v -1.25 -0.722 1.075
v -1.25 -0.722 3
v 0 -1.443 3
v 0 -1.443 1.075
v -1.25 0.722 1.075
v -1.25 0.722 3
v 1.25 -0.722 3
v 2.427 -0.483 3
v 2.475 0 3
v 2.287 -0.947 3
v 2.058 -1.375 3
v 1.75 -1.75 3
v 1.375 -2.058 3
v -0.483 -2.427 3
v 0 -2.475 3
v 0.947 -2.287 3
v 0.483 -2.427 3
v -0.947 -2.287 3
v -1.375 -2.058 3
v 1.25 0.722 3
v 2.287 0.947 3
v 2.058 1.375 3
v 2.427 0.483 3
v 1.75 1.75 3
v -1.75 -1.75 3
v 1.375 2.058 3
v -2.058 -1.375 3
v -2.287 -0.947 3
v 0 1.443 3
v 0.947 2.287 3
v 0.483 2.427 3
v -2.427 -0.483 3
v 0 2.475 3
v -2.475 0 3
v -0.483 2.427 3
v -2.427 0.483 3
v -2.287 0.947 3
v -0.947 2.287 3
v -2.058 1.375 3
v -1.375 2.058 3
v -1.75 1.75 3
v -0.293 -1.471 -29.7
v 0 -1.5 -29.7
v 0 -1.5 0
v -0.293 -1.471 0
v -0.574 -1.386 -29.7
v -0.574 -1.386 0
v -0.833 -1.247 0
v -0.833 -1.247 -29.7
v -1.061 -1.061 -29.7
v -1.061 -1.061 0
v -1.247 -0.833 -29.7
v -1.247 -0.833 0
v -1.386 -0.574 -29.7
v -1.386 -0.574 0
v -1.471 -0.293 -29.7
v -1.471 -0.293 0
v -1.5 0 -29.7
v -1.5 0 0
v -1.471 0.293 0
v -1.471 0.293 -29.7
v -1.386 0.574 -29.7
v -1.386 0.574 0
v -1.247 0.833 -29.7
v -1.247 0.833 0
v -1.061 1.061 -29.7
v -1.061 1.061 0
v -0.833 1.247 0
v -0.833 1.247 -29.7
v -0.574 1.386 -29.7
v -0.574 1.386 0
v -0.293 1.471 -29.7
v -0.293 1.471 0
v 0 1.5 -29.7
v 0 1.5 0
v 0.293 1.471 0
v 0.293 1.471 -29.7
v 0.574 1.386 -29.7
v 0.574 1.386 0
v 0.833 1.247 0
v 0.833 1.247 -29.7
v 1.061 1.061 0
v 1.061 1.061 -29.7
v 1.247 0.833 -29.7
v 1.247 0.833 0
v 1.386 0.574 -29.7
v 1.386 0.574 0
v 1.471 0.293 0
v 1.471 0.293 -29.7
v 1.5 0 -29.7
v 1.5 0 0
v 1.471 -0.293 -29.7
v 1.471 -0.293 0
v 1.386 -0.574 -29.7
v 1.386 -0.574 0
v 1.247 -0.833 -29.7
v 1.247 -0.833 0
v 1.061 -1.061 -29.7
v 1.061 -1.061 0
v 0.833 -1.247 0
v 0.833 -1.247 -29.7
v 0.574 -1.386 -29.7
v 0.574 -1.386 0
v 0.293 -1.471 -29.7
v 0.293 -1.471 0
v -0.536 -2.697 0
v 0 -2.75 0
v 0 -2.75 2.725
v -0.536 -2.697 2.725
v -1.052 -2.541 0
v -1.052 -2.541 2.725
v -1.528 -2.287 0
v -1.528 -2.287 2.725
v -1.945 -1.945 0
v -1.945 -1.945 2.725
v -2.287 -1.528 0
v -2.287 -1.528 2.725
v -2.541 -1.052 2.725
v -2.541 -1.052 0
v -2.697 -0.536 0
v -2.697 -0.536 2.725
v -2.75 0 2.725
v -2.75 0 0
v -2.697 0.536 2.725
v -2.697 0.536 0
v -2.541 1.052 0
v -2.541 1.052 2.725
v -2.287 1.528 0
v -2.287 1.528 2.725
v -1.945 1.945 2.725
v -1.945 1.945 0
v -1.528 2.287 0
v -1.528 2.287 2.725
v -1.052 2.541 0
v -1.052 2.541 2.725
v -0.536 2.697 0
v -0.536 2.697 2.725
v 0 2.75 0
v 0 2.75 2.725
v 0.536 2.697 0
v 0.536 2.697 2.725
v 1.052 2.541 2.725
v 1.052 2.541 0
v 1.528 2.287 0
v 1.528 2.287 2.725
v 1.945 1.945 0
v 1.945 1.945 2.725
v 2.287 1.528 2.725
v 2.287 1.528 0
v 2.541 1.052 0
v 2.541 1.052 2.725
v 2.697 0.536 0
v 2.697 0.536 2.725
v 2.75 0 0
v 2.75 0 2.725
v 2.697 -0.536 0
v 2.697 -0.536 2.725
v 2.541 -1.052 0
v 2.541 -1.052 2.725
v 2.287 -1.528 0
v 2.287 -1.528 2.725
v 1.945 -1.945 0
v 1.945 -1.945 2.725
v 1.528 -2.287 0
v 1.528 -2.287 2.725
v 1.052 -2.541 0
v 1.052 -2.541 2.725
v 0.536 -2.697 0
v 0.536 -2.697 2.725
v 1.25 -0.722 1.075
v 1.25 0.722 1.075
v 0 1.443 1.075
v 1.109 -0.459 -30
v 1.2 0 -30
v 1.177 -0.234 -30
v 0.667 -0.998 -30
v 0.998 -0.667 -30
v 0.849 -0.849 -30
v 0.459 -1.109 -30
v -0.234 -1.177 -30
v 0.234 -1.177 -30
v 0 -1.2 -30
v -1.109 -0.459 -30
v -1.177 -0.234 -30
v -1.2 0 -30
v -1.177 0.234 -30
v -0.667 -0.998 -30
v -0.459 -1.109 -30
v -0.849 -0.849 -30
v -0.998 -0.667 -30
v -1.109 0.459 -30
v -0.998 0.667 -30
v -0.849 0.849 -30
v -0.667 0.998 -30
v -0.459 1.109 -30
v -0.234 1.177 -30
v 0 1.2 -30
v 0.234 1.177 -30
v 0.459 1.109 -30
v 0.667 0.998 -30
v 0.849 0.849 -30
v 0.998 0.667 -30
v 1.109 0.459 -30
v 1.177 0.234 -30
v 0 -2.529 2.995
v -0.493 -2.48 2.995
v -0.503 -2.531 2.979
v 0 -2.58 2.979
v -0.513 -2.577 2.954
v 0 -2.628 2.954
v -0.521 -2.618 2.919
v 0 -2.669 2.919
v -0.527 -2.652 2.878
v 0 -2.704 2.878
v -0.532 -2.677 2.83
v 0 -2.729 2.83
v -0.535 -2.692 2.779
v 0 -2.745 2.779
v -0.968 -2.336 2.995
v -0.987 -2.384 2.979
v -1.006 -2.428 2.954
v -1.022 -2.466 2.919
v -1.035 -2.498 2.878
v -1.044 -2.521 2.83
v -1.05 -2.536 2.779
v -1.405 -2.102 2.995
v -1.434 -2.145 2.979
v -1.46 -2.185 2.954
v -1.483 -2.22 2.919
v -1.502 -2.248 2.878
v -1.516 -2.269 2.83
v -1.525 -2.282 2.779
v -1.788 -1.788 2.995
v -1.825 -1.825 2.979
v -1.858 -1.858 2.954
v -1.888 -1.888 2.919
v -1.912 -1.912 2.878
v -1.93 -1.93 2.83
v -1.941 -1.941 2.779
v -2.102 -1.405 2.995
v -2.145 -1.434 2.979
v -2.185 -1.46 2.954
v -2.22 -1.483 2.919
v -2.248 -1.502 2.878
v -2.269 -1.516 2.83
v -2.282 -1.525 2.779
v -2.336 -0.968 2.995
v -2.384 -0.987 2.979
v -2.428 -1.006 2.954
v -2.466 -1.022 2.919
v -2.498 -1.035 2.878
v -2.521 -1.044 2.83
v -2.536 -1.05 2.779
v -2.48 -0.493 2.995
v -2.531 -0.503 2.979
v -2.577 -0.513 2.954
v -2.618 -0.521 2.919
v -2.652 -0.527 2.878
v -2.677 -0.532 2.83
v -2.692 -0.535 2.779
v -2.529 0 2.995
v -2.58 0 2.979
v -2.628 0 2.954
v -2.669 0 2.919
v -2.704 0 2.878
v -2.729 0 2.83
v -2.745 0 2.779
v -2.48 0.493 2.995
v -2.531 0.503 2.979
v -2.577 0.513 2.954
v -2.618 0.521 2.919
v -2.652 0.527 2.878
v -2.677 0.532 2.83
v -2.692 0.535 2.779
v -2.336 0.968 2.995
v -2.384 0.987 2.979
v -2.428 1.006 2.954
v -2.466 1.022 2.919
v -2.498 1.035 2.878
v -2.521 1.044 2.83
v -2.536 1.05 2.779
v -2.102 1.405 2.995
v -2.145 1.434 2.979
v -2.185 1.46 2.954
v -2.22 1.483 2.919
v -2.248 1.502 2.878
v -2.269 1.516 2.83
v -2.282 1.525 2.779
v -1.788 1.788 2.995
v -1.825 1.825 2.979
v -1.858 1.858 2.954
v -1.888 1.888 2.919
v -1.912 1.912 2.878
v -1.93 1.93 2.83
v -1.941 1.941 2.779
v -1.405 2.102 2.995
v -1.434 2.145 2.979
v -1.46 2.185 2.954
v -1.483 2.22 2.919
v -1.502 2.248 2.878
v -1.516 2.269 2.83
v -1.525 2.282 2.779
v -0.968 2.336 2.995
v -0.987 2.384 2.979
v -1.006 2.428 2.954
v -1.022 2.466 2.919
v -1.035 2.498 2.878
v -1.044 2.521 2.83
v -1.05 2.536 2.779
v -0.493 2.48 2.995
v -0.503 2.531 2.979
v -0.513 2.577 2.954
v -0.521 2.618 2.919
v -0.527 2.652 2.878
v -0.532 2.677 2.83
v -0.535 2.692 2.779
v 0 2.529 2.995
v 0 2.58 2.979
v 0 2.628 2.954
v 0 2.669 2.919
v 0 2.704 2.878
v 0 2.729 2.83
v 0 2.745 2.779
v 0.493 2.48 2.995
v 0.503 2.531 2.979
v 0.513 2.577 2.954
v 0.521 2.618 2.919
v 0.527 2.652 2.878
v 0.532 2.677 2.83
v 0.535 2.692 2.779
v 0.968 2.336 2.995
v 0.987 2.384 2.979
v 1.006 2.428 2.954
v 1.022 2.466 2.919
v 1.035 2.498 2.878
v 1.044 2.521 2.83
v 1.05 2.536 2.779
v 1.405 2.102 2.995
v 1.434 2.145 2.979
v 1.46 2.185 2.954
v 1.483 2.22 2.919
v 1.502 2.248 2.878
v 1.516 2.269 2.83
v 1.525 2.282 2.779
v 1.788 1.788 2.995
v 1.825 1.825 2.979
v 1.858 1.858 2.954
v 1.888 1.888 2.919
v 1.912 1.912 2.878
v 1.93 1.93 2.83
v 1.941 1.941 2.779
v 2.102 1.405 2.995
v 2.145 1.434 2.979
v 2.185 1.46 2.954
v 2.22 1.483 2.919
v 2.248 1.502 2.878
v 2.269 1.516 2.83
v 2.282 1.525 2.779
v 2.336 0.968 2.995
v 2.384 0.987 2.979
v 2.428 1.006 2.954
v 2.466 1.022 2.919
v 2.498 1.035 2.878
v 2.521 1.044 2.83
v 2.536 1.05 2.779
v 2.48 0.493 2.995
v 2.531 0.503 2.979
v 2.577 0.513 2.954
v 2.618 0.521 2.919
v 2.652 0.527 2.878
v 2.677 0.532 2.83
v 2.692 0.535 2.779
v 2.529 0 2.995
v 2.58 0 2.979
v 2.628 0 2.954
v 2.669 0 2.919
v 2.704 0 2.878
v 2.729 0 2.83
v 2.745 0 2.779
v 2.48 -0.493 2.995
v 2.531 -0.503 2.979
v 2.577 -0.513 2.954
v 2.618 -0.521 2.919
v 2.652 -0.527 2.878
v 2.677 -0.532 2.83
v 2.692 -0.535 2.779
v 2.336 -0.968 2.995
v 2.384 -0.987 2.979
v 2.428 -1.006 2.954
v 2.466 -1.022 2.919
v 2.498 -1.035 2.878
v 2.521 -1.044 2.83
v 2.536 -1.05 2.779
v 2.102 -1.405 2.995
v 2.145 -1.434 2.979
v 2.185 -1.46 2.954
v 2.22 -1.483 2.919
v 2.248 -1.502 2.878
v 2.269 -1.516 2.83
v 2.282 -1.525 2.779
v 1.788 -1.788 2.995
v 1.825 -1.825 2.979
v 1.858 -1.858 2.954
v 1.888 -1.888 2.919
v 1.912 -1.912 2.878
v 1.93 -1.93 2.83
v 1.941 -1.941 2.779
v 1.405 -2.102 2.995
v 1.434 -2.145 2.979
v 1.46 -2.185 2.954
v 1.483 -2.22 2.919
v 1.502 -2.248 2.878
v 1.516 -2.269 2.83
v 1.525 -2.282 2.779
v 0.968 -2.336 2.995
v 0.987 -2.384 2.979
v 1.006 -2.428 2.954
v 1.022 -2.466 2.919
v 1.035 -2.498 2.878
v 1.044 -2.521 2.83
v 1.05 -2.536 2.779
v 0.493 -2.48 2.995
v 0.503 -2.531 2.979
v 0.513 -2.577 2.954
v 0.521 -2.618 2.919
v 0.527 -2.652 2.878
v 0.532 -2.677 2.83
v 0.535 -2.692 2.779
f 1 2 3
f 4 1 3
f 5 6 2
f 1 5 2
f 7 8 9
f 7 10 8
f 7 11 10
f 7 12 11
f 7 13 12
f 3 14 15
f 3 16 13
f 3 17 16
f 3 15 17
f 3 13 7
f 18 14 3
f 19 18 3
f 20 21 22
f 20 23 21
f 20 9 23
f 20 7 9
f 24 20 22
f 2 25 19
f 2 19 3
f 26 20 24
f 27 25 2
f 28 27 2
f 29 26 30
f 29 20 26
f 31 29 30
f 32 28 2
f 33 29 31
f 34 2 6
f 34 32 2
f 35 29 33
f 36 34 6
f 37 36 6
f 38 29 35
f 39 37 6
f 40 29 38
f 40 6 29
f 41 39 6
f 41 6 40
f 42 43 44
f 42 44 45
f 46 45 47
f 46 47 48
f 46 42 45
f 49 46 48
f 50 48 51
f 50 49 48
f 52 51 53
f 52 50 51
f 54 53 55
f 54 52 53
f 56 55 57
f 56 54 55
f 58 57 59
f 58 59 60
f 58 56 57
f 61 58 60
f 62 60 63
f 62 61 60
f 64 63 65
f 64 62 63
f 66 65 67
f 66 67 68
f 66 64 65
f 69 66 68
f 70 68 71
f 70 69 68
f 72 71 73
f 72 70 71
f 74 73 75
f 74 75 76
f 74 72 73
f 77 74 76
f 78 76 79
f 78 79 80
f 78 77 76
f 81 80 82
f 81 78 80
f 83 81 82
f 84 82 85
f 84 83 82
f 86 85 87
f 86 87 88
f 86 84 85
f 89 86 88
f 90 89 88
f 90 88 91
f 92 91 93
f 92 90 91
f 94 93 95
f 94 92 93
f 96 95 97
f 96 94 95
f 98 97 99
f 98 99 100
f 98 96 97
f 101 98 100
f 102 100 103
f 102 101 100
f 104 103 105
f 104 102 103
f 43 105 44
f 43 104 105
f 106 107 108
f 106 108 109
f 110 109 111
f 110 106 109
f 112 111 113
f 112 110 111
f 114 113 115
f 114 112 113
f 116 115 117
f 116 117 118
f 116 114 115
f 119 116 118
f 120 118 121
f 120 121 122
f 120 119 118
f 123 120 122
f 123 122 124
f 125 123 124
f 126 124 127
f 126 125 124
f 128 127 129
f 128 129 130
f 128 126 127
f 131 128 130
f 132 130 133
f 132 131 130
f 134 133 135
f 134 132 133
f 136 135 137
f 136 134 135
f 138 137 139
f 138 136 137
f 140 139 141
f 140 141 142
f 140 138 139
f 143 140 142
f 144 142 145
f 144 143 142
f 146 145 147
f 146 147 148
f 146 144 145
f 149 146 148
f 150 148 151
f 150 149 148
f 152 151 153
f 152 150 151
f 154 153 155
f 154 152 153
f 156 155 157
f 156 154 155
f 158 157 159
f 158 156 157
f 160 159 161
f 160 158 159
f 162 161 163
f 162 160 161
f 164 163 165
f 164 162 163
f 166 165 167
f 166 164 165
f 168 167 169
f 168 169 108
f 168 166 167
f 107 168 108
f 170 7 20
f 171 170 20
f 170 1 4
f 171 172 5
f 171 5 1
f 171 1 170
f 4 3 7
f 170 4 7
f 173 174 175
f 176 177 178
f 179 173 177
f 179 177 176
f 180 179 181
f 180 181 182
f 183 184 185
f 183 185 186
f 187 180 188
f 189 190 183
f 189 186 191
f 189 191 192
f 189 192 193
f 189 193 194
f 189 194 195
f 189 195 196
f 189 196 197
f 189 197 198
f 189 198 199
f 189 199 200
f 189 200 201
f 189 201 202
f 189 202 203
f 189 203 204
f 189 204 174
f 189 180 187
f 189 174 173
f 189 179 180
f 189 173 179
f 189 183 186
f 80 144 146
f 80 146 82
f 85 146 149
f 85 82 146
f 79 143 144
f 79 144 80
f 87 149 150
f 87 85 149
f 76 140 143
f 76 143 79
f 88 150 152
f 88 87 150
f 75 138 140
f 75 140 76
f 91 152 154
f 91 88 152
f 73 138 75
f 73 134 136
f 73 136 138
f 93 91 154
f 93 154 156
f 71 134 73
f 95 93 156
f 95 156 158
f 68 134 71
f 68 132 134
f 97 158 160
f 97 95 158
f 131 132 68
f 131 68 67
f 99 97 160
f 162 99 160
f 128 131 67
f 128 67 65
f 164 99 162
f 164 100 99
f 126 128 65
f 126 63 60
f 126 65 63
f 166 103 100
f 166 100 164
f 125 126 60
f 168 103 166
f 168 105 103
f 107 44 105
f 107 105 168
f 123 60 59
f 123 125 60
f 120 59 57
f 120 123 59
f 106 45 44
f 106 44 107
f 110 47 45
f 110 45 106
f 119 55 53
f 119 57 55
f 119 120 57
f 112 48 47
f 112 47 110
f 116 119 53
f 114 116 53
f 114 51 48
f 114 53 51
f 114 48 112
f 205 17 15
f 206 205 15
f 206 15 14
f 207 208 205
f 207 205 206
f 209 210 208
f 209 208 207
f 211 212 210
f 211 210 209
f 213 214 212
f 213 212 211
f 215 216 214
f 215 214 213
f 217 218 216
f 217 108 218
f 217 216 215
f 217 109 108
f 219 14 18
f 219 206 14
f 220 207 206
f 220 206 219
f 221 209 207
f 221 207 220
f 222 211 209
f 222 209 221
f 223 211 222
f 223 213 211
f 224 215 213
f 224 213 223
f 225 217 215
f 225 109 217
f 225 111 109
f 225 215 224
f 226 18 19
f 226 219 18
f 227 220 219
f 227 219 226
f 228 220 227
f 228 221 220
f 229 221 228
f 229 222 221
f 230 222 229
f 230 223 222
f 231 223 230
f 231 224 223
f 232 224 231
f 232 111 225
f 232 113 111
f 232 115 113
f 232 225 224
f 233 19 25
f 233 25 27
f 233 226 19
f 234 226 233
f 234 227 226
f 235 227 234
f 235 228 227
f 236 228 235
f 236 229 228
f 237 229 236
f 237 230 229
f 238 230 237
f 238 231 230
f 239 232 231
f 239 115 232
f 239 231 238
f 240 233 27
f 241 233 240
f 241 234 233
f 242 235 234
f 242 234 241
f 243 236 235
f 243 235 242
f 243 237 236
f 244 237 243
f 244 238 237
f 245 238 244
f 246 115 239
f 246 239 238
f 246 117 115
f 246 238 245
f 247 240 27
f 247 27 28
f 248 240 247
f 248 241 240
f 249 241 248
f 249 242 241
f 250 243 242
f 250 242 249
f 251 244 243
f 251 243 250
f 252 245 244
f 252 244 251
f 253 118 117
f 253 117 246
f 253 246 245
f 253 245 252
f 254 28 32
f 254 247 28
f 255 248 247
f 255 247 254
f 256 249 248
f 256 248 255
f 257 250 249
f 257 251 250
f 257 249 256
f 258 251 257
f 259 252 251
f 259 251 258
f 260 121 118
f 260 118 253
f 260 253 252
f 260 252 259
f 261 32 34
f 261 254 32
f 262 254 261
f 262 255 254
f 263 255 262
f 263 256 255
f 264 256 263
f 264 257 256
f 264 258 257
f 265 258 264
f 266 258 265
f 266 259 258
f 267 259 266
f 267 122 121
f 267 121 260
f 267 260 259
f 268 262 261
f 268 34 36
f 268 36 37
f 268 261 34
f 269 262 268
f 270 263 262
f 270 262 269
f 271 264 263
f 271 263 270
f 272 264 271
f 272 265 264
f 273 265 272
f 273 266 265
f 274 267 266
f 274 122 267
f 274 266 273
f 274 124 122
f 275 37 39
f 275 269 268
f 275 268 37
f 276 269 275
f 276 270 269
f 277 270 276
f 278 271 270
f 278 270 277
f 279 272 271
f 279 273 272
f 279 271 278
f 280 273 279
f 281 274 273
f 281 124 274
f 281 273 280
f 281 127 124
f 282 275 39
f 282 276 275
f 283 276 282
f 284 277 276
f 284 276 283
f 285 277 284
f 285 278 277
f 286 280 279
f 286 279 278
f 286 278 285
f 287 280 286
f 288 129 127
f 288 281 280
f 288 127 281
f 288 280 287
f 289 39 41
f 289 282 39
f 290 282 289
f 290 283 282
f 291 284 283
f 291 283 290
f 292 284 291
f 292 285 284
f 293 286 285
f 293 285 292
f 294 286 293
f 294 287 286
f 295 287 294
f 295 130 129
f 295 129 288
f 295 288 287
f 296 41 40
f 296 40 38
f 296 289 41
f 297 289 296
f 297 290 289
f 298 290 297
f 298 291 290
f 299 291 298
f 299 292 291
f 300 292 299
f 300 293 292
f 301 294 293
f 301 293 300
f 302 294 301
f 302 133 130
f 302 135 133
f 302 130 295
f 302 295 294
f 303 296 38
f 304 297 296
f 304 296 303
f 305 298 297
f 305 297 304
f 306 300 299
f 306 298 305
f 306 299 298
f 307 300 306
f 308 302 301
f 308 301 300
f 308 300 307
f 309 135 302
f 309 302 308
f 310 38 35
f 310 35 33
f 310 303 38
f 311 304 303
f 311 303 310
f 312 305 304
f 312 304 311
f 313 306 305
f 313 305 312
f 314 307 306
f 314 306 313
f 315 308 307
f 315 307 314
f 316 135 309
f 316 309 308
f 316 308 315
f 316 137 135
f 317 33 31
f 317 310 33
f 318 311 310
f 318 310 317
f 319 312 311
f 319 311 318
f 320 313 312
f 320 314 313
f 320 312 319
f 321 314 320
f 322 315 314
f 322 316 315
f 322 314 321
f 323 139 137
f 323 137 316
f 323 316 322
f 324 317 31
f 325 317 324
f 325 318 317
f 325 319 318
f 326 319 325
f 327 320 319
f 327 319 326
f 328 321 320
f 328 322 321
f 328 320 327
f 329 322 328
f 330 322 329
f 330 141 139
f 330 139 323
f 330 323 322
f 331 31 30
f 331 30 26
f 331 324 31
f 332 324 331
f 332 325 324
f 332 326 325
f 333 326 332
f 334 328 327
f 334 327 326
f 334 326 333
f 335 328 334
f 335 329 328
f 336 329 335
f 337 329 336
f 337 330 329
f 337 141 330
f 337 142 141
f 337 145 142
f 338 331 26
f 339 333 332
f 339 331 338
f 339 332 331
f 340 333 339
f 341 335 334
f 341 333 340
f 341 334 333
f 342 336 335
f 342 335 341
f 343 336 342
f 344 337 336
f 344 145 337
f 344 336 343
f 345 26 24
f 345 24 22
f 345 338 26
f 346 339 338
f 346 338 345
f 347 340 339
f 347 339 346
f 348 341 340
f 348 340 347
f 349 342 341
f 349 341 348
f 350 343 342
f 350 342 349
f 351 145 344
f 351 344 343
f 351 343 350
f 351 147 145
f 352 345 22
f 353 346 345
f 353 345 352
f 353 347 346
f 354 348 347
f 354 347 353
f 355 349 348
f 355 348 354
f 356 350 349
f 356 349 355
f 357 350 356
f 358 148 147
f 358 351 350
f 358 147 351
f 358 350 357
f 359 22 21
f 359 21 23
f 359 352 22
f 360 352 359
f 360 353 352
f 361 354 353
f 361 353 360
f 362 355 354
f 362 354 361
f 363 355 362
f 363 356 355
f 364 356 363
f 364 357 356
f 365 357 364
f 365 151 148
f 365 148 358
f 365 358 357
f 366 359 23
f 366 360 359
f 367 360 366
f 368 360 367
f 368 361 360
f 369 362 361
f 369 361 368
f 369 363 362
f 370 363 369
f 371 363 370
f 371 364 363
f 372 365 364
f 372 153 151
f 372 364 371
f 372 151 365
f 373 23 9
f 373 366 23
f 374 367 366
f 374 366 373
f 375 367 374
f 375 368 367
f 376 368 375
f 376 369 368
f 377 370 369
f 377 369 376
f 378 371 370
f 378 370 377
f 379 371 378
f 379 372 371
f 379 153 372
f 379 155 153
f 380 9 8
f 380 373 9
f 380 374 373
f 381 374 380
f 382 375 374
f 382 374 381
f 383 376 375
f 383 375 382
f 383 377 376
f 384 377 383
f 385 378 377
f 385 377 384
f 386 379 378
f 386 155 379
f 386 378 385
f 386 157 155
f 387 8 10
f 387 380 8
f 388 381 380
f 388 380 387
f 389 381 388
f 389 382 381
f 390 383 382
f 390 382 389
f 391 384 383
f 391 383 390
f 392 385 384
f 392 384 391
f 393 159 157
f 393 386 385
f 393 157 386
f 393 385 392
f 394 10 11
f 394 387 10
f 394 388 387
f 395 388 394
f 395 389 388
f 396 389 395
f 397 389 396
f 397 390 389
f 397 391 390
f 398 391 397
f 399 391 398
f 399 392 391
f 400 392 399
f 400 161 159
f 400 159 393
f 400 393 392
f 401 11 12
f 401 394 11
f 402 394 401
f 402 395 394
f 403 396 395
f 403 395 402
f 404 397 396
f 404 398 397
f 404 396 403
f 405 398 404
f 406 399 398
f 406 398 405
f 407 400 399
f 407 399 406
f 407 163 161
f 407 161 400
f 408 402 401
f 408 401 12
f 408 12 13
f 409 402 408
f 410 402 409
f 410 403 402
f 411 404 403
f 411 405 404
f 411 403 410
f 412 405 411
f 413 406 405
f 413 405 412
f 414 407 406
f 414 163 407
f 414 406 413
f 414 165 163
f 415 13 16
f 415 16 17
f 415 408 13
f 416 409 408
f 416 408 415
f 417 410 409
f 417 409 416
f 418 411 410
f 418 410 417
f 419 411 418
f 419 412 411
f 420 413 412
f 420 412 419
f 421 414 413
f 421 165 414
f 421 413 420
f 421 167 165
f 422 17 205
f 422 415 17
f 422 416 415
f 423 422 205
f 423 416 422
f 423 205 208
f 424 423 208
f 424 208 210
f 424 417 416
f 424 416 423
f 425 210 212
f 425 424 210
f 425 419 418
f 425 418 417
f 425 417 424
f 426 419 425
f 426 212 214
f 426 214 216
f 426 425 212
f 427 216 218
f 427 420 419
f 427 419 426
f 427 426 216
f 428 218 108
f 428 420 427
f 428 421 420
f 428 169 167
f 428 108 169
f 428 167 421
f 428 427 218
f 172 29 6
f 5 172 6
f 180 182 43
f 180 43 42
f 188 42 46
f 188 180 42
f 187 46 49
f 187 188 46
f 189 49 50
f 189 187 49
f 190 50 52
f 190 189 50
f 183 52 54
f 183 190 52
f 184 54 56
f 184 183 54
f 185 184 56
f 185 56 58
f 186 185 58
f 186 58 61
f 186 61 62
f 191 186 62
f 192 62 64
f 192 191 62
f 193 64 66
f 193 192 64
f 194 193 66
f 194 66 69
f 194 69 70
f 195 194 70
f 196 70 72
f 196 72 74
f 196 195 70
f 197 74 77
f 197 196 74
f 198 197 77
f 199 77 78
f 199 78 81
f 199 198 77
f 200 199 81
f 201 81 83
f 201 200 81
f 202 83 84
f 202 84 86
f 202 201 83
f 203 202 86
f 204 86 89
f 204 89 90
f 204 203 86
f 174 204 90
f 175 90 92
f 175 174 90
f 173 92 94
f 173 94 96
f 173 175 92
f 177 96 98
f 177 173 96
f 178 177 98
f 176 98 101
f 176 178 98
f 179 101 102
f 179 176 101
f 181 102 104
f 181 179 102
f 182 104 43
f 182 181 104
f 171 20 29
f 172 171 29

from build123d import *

# Parameters (mm, degrees)
CUT_EXTRUDE_1_DEPTH = 1.925
FILLET_1_R          = 0.275
CHAMFER_1_SIZE      = 0.3


with BuildPart() as part:
    # 草图3 → 旋转1 (revolve)
    with BuildSketch(Plane(origin=(0, 0, 0), x_dir=(0, 0, -1), z_dir=(1, 0, 0)), mode=Mode.PRIVATE) as revolve_1_sk:
        Polygon((-3, 0), (-3, 2.75), (0, 2.75), (0, 1.5), (30, 1.5), (30, 0), align=None)
    revolve(revolve_1_sk.sketch.rotate(Axis((0, 0, 3), (0, 0, -1)), 180), axis=Axis((0, 0, 3), (0, 0, -1)))

    # 草图4 → 切除-拉伸1 (cut)
    with BuildSketch(Plane.XY.offset(3)):
        Polygon((0, 1.443375673), (-1.25, 0.721687836), (-1.25, -0.721687836), (0, -1.443375673), (1.25, -0.721687836), (1.25, 0.721687836), align=None)
    extrude(amount=-CUT_EXTRUDE_1_DEPTH, mode=Mode.SUBTRACT)

    # 圆角1
    fillet_1_edges = [part.edges().sort_by_distance(p)[0] for p in [
        (0, 2.75, 3),
    ]]
    fillet(fillet_1_edges, radius=FILLET_1_R)

    # 倒角1
    chamfer_1_edges = [part.edges().sort_by_distance(p)[0] for p in [
        (0, 1.5, -30),
    ]]
    chamfer(chamfer_1_edges, length=CHAMFER_1_SIZE)


solid = part.part
